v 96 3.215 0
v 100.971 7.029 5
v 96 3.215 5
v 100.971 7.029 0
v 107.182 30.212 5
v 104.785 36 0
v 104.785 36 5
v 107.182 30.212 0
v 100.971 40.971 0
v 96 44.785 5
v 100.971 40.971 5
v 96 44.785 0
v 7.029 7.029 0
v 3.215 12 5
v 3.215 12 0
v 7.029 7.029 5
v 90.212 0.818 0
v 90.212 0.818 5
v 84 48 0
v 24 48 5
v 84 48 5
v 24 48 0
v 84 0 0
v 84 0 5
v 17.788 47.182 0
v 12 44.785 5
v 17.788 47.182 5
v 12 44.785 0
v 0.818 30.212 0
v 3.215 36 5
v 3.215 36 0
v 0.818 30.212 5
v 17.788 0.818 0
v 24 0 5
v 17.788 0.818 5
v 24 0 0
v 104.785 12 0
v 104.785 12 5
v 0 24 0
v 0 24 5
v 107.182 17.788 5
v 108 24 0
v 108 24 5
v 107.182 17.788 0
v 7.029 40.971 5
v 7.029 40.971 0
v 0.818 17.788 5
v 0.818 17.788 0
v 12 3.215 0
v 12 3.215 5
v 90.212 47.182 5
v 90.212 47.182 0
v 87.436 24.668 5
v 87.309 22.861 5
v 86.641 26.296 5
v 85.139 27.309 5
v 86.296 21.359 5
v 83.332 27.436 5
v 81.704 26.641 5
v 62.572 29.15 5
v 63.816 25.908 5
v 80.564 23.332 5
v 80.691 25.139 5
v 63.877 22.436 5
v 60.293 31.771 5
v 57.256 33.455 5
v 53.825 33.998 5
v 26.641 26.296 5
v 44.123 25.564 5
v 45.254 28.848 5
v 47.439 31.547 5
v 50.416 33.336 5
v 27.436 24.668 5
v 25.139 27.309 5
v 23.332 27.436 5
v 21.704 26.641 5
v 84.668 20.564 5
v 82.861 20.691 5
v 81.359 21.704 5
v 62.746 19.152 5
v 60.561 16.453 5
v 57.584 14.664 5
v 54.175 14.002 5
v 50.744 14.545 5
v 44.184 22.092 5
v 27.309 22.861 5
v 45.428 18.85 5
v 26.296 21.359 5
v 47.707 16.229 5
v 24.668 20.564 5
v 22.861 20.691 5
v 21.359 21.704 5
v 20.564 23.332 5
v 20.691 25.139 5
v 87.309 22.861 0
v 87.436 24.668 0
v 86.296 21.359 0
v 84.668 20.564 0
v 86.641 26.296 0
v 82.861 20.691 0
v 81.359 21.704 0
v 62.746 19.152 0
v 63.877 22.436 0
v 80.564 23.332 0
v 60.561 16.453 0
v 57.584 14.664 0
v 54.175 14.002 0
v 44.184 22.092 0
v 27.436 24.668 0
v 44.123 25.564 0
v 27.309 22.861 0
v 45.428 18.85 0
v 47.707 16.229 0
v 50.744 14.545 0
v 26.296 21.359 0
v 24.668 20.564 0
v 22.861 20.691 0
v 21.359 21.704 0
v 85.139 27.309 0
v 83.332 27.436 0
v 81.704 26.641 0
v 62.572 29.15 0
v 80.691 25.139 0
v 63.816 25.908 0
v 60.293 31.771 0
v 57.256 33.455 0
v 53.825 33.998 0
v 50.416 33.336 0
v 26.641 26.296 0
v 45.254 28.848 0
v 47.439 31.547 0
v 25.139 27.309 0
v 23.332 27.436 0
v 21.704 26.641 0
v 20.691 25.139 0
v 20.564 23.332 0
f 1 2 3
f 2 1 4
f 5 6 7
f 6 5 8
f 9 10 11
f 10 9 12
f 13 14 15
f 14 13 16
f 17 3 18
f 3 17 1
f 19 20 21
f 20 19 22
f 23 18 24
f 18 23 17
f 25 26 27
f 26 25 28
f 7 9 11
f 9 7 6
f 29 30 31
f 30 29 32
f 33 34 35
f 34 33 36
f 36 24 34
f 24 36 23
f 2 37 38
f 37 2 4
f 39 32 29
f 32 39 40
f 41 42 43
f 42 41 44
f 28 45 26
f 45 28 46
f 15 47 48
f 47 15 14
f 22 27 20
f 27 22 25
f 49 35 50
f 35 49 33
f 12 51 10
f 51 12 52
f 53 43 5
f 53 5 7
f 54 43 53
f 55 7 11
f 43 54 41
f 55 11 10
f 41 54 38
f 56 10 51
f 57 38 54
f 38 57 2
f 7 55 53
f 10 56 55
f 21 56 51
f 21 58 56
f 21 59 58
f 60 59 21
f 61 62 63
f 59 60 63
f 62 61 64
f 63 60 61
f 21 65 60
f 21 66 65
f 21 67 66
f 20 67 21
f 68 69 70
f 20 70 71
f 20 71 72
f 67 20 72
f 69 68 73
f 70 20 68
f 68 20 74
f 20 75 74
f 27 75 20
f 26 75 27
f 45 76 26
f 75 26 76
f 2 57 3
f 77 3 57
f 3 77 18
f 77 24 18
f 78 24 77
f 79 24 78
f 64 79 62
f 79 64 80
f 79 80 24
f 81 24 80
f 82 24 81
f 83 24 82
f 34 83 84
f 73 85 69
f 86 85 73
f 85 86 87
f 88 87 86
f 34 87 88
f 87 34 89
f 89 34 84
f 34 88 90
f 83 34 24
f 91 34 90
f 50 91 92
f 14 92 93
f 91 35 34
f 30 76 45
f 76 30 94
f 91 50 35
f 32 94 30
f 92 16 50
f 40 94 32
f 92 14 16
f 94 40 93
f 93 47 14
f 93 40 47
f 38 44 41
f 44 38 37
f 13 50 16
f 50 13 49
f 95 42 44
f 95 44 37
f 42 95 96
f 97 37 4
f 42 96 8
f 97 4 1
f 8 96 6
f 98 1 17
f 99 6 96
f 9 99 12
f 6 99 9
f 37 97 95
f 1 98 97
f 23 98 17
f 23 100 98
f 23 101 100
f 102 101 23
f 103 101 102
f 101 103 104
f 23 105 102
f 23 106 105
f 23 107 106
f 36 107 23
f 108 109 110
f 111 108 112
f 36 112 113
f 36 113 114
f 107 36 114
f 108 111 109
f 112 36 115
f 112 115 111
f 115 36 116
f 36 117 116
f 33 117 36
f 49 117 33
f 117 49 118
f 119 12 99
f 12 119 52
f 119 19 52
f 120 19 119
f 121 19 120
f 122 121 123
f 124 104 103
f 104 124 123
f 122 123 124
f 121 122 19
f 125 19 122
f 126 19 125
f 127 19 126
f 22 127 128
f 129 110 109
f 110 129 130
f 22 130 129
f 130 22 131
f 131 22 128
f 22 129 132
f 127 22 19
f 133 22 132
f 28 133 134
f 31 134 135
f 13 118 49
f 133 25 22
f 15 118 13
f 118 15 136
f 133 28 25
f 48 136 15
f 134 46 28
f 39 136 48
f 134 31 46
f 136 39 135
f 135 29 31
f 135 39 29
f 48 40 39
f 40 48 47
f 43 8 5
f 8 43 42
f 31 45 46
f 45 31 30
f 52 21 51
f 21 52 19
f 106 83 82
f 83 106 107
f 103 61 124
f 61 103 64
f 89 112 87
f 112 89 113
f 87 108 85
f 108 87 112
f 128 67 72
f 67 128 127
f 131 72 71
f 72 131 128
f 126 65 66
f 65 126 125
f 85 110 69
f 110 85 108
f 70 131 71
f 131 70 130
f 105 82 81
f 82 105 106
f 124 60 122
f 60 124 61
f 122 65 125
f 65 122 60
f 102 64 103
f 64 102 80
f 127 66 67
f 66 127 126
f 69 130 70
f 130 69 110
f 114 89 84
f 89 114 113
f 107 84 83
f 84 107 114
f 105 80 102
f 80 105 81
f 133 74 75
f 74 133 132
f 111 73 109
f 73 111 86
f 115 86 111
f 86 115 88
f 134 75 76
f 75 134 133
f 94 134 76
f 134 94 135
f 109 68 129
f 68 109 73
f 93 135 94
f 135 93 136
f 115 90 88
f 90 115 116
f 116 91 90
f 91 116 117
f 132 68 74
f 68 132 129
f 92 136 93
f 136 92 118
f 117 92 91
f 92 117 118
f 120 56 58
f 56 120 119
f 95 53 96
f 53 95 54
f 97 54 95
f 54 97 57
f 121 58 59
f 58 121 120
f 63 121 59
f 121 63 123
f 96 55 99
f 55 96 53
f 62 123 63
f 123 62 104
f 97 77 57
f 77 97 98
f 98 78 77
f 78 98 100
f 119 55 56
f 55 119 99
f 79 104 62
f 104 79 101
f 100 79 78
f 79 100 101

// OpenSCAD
$fn = 32;

// ----------------------------------------------------------------------
// Spacer plate: obround span 60, caps R24
// ----------------------------------------------------------------------

// --- parameters (mm) ---
bore_r = 10;              // centre bore radius
bolt_r = 3.5;             // bolt hole radius
plate_t = 5;              // plate thickness, Z (extrusion height)
span = 60;                // obround span
cap_r = 24;               // cap radius
fit_tol = 0.02;           // declared fit tolerance (prompt contract)
free_tol = 0.2;           // declared free tolerance (prompt contract)

profile = [[24, 48], [17.788, 47.182], [12, 44.785], [7.029, 40.971], [3.215, 36], [0.818, 30.212], [0, 24], [0.818, 17.788], [3.215, 12], [7.029, 7.029], [12, 3.215], [17.788, 0.818], [24, 0], [84, 0], [90.212, 0.818], [96, 3.215], [100.971, 7.029], [104.785, 12], [107.182, 17.788], [108, 24], [107.182, 30.212], [104.785, 36], [100.971, 40.971], [96, 44.785], [90.212, 47.182], [84, 48]];  // primary outline, 26 points, counter clockwise
void_1 = [[63.816, 25.908], [62.572, 29.15], [60.293, 31.771], [57.256, 33.455], [53.825, 33.998], [50.416, 33.336], [47.439, 31.547], [45.254, 28.848], [44.123, 25.564], [44.184, 22.092], [45.428, 18.85], [47.707, 16.229], [50.744, 14.545], [54.175, 14.002], [57.584, 14.664], [60.561, 16.453], [62.746, 19.152], [63.877, 22.436]];  // centre bore, 18 points
void_2 = [[27.436, 24.668], [26.641, 26.296], [25.139, 27.309], [23.332, 27.436], [21.704, 26.641], [20.691, 25.139], [20.564, 23.332], [21.359, 21.704], [22.861, 20.691], [24.668, 20.564], [26.296, 21.359], [27.309, 22.861]];  // end hole, 12 points
void_3 = [[87.436, 24.668], [86.641, 26.296], [85.139, 27.309], [83.332, 27.436], [81.704, 26.641], [80.691, 25.139], [80.564, 23.332], [81.359, 21.704], [82.861, 20.691], [84.668, 20.564], [86.296, 21.359], [87.309, 22.861]];  // end hole, 12 points

// --- the one profile operation ---
difference() {
  linear_extrude(height = plate_t) polygon(points = profile);
  translate([0, 0, -1])
    linear_extrude(height = plate_t + 2) polygon(points = void_1);
  translate([0, 0, -1])
    linear_extrude(height = plate_t + 2) polygon(points = void_2);
  translate([0, 0, -1])
    linear_extrude(height = plate_t + 2) polygon(points = void_3);
}
